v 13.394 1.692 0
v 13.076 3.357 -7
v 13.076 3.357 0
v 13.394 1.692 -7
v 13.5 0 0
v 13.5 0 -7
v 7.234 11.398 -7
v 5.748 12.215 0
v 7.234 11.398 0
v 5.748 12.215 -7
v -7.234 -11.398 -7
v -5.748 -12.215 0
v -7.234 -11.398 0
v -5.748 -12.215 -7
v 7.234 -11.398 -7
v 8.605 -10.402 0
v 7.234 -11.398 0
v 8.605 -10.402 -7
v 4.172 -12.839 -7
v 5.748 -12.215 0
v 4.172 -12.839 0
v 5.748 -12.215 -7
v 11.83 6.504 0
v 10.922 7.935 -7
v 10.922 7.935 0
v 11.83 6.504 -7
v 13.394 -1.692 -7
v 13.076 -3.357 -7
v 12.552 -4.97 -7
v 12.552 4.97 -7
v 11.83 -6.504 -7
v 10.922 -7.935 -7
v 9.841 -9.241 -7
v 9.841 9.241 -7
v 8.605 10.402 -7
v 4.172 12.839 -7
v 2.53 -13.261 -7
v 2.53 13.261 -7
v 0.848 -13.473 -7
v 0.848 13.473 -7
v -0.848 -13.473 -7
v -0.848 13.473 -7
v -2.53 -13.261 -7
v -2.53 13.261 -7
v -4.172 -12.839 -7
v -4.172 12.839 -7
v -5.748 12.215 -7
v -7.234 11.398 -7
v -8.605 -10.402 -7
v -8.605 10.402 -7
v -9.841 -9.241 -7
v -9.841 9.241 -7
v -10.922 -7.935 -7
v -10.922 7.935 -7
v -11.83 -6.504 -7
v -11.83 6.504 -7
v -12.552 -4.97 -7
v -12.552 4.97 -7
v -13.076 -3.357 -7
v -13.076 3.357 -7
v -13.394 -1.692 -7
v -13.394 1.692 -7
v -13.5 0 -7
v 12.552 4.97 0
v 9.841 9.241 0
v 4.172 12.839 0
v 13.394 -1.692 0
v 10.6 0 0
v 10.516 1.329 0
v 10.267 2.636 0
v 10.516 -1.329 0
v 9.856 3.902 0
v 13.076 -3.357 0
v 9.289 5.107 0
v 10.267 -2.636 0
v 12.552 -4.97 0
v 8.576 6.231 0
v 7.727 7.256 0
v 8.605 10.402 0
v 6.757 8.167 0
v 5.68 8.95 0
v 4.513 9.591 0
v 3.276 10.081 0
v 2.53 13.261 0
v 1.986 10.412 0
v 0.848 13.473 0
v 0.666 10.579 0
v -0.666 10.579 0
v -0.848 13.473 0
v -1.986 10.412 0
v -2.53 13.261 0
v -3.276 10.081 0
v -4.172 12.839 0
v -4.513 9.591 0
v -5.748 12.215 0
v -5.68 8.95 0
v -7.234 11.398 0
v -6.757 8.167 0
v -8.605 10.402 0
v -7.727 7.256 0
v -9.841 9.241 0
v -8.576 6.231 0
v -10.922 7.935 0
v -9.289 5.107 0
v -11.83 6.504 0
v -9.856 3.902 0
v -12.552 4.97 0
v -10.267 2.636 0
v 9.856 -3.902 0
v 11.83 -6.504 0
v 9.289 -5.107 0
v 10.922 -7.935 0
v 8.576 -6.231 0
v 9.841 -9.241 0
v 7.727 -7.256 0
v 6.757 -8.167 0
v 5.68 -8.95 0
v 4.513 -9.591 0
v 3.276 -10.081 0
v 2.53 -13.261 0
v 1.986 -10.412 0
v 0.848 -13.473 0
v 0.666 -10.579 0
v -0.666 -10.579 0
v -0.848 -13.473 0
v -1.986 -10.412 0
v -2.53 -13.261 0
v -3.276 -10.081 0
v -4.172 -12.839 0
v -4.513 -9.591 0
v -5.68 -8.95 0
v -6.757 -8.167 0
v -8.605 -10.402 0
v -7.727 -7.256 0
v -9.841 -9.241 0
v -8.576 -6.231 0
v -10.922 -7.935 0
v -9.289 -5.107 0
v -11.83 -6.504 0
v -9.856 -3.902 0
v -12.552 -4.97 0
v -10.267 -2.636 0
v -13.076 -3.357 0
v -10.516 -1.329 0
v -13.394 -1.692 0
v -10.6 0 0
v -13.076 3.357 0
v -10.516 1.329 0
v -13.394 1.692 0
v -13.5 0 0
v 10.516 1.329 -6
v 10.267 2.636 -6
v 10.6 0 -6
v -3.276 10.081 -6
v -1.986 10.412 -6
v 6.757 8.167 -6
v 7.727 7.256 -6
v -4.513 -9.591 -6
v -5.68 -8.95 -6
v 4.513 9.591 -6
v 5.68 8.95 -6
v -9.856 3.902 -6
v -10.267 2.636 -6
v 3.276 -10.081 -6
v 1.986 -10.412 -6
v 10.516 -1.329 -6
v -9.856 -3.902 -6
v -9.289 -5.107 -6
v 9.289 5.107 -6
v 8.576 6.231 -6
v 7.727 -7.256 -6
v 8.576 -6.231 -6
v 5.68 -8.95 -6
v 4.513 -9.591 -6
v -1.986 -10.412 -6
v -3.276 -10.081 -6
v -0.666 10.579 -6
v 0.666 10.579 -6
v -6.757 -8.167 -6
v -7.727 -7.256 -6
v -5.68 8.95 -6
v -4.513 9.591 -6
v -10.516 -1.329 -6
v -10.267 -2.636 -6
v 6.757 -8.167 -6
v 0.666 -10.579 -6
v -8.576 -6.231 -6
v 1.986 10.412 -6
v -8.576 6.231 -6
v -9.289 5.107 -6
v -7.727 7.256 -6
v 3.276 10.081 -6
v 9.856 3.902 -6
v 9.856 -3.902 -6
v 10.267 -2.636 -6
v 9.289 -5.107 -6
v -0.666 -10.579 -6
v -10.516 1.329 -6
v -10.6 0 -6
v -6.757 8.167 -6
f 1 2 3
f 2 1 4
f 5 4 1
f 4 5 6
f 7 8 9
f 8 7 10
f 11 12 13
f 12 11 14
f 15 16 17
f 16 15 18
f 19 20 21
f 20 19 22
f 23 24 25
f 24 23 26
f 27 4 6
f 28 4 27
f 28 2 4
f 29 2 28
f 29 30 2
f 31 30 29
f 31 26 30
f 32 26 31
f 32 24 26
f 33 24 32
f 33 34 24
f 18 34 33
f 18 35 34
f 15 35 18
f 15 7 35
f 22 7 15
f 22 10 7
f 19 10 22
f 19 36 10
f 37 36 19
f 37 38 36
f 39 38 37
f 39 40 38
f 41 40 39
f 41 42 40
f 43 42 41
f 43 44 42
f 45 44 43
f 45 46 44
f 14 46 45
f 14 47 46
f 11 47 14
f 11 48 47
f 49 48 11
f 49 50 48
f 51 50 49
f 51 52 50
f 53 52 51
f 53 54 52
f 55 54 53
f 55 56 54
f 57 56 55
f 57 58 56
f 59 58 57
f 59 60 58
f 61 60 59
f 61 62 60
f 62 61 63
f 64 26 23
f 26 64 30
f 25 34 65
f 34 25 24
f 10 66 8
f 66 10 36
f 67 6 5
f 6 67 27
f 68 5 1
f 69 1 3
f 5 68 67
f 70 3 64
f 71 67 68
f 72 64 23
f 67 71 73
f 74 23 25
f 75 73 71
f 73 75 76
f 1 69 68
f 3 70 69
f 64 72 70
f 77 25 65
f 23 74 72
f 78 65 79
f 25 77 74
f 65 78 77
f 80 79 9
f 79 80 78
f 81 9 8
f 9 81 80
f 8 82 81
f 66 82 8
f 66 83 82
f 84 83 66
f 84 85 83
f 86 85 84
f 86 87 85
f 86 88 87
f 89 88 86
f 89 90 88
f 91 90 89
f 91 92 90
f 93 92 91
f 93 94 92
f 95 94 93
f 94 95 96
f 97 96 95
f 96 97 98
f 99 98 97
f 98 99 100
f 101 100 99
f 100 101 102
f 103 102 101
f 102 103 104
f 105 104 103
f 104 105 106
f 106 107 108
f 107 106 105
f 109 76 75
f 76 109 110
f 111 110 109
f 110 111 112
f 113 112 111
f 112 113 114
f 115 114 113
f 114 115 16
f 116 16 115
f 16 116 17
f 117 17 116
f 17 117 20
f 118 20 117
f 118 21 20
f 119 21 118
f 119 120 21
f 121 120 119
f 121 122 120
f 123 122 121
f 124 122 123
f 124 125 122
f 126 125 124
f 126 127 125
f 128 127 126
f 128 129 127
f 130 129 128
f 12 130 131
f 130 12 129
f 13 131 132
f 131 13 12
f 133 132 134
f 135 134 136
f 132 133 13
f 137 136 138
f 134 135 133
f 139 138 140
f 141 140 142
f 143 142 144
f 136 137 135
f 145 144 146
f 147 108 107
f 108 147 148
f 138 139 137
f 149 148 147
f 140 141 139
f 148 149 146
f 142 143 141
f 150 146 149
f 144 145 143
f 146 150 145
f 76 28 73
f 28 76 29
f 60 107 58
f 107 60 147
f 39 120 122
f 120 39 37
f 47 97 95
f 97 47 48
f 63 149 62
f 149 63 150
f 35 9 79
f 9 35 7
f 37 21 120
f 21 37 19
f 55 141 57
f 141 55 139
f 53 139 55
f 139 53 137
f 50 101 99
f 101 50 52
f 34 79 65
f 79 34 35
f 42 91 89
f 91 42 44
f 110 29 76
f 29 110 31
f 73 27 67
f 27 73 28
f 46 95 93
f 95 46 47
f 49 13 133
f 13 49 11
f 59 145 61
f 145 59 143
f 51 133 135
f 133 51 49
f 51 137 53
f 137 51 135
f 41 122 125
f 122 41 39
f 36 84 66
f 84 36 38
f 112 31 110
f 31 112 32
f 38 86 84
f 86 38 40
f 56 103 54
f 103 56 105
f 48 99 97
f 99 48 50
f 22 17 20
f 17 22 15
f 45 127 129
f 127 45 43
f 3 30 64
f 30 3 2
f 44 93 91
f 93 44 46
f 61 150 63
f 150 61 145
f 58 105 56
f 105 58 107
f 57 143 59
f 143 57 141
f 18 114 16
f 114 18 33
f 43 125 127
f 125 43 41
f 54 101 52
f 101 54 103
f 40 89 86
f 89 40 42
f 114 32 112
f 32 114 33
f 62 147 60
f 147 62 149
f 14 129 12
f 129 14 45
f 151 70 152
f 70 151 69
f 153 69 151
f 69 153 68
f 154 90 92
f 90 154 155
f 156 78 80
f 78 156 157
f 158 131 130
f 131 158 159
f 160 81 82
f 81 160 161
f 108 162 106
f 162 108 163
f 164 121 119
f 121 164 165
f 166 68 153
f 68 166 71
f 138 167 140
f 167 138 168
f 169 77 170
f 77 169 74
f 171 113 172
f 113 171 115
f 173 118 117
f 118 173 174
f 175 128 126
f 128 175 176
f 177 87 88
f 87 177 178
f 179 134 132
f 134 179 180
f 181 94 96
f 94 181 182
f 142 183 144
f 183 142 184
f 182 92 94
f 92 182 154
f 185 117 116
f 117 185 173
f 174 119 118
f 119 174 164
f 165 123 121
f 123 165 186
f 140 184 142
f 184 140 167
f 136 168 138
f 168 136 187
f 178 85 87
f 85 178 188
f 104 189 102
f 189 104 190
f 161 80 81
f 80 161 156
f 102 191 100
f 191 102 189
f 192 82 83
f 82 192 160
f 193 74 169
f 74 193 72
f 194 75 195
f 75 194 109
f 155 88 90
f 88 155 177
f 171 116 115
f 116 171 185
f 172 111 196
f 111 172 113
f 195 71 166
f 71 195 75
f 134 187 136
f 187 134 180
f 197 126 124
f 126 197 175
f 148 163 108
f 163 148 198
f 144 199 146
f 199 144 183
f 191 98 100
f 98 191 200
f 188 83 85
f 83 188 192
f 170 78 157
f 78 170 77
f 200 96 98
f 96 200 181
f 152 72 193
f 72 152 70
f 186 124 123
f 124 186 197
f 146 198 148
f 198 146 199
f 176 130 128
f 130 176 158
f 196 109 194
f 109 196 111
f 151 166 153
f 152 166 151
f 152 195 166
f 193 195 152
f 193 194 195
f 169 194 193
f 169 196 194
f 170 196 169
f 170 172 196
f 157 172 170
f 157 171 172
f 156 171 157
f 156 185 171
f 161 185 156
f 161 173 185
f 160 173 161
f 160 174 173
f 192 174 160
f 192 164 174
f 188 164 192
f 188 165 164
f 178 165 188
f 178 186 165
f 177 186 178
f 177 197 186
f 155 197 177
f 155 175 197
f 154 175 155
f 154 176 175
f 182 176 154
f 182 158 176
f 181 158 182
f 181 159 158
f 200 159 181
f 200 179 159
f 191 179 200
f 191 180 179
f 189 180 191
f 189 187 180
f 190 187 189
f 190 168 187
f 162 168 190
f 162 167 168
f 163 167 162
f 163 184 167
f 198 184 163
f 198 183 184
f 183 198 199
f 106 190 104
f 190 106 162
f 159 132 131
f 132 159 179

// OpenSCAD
$fn = 50;


difference() {
	union() {
		translate(v = [0, 0, -7.0000000000]) {
			cylinder(h = 7, r = 13.5000000000);
		}
	}
	union() {
		#translate(v = [0, 0, -6.0000000000]) {
			cylinder(h = 6, r = 10.6000000000);
		}
	}
}
